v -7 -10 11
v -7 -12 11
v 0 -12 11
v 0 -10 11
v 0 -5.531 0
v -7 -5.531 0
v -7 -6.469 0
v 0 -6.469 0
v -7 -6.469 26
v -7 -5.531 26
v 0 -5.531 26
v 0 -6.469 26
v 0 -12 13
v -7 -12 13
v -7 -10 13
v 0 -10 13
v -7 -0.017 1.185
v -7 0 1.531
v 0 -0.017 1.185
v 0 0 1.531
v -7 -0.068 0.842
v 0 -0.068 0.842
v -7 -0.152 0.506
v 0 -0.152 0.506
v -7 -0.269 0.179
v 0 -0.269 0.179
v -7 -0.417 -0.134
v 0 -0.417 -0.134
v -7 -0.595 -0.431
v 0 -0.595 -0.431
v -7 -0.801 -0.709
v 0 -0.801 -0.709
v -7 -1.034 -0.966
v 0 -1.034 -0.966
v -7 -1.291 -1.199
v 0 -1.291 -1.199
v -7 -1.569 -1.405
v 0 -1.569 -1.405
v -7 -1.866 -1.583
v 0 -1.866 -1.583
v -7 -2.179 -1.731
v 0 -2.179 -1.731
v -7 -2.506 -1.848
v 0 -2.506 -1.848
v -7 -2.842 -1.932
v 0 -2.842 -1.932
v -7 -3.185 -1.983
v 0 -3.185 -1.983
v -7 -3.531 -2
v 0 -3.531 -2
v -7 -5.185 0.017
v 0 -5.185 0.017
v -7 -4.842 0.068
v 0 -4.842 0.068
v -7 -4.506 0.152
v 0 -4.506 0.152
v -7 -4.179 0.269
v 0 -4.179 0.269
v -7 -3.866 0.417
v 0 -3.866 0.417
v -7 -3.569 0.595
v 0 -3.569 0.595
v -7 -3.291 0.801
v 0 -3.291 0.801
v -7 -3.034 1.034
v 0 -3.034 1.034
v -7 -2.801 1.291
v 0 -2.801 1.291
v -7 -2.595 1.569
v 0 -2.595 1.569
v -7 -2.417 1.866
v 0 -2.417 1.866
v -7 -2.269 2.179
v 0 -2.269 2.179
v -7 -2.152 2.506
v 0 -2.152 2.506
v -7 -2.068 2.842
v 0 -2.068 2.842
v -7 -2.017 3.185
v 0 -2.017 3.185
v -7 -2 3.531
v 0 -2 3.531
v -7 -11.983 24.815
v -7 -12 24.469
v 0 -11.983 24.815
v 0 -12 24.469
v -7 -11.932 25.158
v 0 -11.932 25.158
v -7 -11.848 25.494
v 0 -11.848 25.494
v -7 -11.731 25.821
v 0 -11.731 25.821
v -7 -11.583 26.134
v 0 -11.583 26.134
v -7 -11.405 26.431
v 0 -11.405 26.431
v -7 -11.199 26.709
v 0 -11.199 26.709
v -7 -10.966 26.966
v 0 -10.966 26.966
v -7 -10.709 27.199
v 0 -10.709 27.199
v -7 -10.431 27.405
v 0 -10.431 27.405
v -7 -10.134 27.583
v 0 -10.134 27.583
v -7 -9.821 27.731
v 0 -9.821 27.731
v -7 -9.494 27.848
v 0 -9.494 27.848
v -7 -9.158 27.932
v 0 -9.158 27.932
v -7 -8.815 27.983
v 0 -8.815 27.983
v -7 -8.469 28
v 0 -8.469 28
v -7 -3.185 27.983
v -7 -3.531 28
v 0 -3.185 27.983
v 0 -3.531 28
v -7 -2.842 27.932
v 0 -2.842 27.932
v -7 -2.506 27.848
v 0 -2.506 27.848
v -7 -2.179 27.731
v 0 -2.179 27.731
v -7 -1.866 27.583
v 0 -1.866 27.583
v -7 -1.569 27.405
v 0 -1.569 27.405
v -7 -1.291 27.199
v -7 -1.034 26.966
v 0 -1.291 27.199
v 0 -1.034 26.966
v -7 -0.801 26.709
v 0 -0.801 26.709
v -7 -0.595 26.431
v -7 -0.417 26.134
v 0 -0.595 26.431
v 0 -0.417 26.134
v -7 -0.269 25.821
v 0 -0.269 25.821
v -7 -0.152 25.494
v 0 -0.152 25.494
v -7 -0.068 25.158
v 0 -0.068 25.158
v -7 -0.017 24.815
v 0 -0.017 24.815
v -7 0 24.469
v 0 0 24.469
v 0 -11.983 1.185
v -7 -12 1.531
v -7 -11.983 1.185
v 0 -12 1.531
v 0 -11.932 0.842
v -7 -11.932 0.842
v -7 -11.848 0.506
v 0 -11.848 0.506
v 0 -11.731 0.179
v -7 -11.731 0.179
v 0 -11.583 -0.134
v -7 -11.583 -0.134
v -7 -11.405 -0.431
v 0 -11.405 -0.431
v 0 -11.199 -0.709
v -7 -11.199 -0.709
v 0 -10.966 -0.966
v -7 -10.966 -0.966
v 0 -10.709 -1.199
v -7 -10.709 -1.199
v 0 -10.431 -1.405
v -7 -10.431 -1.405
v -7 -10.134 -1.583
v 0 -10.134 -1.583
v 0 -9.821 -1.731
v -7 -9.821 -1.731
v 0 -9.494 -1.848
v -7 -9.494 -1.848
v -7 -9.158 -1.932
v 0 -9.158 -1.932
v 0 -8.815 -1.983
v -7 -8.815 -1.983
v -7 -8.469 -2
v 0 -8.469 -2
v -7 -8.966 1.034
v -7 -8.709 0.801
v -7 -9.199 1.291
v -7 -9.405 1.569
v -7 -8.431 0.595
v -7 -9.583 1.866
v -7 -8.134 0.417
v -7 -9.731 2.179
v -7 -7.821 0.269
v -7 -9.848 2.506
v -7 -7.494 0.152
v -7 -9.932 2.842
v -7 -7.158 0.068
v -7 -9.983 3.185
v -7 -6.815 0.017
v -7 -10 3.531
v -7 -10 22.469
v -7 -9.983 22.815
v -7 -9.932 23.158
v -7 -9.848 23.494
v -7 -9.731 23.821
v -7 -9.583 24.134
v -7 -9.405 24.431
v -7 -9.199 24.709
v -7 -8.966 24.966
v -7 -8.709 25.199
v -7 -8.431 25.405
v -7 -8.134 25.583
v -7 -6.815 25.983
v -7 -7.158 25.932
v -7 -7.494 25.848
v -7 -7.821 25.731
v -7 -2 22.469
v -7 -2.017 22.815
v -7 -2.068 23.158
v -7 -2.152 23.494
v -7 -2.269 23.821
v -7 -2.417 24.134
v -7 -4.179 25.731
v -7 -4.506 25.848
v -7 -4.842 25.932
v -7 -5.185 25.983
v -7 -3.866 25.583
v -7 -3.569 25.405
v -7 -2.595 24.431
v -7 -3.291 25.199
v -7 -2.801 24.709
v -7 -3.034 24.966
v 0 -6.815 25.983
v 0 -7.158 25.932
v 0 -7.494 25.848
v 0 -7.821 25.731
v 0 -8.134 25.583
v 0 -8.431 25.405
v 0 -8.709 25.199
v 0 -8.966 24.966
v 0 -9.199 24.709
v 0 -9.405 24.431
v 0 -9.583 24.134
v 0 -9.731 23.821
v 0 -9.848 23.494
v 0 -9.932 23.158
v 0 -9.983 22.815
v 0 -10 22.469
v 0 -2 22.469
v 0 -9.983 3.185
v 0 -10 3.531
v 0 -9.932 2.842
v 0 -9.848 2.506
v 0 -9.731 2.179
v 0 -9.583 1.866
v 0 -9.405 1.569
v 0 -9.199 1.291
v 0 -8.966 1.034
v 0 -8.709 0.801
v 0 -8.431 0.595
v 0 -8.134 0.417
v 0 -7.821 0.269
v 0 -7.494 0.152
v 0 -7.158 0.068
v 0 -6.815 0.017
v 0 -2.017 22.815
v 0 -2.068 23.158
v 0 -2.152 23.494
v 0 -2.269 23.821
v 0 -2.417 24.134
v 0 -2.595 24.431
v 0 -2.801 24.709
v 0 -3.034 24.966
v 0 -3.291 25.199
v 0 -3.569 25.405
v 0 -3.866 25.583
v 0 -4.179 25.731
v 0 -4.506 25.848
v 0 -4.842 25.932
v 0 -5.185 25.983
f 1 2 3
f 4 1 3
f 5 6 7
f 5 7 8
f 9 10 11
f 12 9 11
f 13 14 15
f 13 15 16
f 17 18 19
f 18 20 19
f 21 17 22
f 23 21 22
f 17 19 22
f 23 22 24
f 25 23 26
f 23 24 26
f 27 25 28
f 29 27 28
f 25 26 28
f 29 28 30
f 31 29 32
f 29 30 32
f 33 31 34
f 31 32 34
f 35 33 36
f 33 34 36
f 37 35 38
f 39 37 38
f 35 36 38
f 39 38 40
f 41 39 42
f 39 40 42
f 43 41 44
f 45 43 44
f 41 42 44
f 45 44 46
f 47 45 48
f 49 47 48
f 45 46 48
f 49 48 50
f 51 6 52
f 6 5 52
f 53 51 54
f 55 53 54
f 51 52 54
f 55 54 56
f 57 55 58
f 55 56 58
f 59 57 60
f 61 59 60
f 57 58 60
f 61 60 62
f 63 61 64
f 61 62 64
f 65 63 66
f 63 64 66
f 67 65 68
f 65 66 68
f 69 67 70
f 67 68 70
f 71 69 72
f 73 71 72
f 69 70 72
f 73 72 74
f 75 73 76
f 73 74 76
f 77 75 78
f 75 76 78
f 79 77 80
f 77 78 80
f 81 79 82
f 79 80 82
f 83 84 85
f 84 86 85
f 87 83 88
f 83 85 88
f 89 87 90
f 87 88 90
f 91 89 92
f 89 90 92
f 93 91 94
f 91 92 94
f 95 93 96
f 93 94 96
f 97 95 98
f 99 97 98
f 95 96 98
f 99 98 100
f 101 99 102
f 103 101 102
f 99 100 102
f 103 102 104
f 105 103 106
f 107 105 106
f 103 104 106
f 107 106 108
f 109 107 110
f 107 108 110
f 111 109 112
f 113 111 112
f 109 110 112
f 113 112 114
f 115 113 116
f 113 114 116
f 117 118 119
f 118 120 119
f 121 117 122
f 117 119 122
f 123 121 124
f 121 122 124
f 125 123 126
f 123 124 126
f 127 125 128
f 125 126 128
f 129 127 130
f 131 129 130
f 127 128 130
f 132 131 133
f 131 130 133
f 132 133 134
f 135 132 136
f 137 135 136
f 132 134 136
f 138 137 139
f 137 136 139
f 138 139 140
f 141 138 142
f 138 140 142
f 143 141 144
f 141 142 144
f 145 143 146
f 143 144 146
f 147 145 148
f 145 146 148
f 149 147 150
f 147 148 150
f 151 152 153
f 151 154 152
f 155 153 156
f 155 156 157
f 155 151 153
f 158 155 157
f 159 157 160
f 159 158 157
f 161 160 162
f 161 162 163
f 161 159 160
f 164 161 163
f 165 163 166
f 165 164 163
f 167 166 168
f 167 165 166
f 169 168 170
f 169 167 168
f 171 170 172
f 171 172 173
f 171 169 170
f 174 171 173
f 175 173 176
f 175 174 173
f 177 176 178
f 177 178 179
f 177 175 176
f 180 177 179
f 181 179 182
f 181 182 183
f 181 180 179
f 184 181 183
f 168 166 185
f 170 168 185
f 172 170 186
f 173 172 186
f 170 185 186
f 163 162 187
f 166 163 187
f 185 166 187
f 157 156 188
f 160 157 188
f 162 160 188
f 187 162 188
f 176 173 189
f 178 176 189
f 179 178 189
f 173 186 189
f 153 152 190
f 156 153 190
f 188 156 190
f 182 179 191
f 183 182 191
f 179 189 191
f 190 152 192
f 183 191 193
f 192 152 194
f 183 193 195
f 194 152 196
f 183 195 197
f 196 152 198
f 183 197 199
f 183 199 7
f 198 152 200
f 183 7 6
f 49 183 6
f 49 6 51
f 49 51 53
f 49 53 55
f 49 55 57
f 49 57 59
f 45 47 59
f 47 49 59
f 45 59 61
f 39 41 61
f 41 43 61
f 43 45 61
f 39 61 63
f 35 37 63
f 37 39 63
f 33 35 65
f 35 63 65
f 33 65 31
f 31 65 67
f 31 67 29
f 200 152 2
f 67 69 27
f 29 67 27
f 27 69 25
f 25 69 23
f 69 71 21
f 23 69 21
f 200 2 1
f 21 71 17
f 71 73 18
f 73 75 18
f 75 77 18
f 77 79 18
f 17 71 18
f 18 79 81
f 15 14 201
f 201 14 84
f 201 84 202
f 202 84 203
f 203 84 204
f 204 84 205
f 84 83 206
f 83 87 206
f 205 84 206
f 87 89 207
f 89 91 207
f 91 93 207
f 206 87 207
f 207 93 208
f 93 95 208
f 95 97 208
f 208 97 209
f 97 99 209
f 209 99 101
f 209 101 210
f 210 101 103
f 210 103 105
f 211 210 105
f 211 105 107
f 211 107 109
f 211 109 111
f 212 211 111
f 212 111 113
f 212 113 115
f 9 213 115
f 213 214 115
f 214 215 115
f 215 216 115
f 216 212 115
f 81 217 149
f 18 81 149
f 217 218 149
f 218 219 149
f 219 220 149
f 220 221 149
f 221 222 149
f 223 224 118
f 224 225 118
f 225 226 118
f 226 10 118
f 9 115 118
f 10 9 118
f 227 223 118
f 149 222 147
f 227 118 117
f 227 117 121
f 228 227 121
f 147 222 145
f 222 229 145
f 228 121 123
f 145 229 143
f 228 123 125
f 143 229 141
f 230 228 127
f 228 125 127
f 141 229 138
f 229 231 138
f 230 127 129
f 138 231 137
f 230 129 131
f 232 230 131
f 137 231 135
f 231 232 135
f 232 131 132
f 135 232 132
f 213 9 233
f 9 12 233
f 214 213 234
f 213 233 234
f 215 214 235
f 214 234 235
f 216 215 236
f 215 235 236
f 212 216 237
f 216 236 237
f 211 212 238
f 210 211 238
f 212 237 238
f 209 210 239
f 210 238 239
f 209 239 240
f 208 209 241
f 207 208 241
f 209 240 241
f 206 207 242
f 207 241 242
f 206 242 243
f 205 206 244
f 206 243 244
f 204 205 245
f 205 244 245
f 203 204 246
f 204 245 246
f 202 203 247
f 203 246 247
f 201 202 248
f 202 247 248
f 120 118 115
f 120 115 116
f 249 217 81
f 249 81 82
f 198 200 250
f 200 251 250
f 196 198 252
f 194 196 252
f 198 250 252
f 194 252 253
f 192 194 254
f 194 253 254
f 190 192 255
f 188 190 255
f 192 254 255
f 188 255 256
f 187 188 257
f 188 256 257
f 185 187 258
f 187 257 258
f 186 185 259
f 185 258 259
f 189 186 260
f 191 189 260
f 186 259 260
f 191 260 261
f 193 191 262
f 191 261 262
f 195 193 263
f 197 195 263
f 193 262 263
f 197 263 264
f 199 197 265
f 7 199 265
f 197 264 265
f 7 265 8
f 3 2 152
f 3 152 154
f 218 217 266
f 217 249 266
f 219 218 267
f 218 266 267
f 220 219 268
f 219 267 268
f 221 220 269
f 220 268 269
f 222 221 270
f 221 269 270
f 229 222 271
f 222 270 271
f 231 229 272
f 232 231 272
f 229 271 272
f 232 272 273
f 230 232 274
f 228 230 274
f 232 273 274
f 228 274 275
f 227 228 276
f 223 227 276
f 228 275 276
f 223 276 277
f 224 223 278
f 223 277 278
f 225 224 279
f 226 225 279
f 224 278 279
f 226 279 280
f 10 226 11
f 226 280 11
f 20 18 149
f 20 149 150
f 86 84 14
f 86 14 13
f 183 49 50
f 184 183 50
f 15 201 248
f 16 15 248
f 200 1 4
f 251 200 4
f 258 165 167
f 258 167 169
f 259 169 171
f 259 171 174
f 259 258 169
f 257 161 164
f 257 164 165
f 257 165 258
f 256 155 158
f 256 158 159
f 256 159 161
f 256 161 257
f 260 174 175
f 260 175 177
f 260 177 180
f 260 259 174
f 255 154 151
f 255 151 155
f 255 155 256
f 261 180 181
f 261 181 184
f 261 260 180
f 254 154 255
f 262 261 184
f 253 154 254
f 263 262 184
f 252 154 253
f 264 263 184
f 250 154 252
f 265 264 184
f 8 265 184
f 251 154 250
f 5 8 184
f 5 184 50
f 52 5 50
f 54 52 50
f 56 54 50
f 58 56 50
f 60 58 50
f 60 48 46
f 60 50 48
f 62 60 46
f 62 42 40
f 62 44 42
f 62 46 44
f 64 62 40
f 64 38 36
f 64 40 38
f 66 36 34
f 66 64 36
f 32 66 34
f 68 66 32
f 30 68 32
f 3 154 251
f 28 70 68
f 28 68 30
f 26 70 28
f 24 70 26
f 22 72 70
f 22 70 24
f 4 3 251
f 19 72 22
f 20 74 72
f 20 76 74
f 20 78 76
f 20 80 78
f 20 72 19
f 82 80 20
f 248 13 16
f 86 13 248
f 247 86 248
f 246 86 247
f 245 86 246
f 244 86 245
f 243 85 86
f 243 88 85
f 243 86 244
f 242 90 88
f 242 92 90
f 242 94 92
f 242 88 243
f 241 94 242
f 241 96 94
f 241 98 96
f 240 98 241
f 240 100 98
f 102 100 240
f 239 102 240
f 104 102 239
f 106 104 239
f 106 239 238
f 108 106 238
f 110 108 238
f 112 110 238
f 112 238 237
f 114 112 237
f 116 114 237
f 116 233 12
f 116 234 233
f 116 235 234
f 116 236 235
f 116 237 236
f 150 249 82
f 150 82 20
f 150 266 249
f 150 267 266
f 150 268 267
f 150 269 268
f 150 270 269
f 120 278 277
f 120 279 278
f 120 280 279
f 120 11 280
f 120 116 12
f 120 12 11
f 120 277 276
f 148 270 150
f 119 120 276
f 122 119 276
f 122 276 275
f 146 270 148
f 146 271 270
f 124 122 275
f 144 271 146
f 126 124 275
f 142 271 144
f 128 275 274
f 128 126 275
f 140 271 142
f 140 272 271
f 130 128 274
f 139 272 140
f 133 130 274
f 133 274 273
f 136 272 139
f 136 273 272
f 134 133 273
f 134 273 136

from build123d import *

# Parameters (mm, degrees)
F0_W     = 7
F0_H     = 26
F1_DEPTH = 2
F2_START = 10
F2_DEPTH = 2
F3_W     = 7
F3_H     = 12
F4_DEPTH = 2
F5_START = -26
F5_DEPTH = 2
F7_W     = 7
F7_H     = 2
F8_DEPTH = 4
F9_R     = 3.5306


with BuildPart() as f1:
    # F0 (on Front) → F1 (new body)
    with BuildSketch(Plane.XZ):
        with Locations((-3.5, 13)):
            Rectangle(F0_W, F0_H)
    extrude(amount=F1_DEPTH)


with BuildPart() as f2:
    # F0 (on Front) → F2 (new body)
    with BuildSketch(Plane.XZ.offset(F2_START)):
        with Locations((-3.5, 13)):
            Rectangle(F0_W, F0_H)
    extrude(amount=F2_DEPTH)


with BuildPart() as f4:
    # F3 (on face) → F4 (new body)
    with BuildSketch(Plane.XY.offset(26)):
        with Locations((-3.5, -6)):
            Rectangle(F3_W, F3_H)
    extrude(amount=F4_DEPTH)


with BuildPart() as f5:
    # F3 (on face) → F5 (new body)
    with BuildSketch(Plane.XY.offset(26).offset(F5_START)):
        with Locations((-3.5, -6)):
            Rectangle(F3_W, F3_H)
    extrude(amount=-F5_DEPTH)


with BuildPart() as f1_1:
    add(f1.part)

    # F6: union F2, F4, F5
    add(f2.part)
    add(f4.part)
    add(f5.part)

    # F7 (on face) → F8 (cut)
    with BuildSketch(Plane.XZ.offset(12)):
        with Locations((-3.5, 12)):
            Rectangle(F7_W, F7_H)
    extrude(amount=-F8_DEPTH, mode=Mode.SUBTRACT)

    # F9
    f9_edges = [f1_1.edges().sort_by_distance(p)[0] for p in [
        (-3.5, -12, 28),
        (-3.5, 0, 28),
        (-3.5, -12, -2),
        (-3.5, 0, -2),
        (-3.5, -2, 26),
        (-3.5, -2, 0),
        (-3.5, -10, 0),
        (-3.5, -10, 26),
    ]]
    fillet(f9_edges, radius=F9_R)


solid = f1_1.part
